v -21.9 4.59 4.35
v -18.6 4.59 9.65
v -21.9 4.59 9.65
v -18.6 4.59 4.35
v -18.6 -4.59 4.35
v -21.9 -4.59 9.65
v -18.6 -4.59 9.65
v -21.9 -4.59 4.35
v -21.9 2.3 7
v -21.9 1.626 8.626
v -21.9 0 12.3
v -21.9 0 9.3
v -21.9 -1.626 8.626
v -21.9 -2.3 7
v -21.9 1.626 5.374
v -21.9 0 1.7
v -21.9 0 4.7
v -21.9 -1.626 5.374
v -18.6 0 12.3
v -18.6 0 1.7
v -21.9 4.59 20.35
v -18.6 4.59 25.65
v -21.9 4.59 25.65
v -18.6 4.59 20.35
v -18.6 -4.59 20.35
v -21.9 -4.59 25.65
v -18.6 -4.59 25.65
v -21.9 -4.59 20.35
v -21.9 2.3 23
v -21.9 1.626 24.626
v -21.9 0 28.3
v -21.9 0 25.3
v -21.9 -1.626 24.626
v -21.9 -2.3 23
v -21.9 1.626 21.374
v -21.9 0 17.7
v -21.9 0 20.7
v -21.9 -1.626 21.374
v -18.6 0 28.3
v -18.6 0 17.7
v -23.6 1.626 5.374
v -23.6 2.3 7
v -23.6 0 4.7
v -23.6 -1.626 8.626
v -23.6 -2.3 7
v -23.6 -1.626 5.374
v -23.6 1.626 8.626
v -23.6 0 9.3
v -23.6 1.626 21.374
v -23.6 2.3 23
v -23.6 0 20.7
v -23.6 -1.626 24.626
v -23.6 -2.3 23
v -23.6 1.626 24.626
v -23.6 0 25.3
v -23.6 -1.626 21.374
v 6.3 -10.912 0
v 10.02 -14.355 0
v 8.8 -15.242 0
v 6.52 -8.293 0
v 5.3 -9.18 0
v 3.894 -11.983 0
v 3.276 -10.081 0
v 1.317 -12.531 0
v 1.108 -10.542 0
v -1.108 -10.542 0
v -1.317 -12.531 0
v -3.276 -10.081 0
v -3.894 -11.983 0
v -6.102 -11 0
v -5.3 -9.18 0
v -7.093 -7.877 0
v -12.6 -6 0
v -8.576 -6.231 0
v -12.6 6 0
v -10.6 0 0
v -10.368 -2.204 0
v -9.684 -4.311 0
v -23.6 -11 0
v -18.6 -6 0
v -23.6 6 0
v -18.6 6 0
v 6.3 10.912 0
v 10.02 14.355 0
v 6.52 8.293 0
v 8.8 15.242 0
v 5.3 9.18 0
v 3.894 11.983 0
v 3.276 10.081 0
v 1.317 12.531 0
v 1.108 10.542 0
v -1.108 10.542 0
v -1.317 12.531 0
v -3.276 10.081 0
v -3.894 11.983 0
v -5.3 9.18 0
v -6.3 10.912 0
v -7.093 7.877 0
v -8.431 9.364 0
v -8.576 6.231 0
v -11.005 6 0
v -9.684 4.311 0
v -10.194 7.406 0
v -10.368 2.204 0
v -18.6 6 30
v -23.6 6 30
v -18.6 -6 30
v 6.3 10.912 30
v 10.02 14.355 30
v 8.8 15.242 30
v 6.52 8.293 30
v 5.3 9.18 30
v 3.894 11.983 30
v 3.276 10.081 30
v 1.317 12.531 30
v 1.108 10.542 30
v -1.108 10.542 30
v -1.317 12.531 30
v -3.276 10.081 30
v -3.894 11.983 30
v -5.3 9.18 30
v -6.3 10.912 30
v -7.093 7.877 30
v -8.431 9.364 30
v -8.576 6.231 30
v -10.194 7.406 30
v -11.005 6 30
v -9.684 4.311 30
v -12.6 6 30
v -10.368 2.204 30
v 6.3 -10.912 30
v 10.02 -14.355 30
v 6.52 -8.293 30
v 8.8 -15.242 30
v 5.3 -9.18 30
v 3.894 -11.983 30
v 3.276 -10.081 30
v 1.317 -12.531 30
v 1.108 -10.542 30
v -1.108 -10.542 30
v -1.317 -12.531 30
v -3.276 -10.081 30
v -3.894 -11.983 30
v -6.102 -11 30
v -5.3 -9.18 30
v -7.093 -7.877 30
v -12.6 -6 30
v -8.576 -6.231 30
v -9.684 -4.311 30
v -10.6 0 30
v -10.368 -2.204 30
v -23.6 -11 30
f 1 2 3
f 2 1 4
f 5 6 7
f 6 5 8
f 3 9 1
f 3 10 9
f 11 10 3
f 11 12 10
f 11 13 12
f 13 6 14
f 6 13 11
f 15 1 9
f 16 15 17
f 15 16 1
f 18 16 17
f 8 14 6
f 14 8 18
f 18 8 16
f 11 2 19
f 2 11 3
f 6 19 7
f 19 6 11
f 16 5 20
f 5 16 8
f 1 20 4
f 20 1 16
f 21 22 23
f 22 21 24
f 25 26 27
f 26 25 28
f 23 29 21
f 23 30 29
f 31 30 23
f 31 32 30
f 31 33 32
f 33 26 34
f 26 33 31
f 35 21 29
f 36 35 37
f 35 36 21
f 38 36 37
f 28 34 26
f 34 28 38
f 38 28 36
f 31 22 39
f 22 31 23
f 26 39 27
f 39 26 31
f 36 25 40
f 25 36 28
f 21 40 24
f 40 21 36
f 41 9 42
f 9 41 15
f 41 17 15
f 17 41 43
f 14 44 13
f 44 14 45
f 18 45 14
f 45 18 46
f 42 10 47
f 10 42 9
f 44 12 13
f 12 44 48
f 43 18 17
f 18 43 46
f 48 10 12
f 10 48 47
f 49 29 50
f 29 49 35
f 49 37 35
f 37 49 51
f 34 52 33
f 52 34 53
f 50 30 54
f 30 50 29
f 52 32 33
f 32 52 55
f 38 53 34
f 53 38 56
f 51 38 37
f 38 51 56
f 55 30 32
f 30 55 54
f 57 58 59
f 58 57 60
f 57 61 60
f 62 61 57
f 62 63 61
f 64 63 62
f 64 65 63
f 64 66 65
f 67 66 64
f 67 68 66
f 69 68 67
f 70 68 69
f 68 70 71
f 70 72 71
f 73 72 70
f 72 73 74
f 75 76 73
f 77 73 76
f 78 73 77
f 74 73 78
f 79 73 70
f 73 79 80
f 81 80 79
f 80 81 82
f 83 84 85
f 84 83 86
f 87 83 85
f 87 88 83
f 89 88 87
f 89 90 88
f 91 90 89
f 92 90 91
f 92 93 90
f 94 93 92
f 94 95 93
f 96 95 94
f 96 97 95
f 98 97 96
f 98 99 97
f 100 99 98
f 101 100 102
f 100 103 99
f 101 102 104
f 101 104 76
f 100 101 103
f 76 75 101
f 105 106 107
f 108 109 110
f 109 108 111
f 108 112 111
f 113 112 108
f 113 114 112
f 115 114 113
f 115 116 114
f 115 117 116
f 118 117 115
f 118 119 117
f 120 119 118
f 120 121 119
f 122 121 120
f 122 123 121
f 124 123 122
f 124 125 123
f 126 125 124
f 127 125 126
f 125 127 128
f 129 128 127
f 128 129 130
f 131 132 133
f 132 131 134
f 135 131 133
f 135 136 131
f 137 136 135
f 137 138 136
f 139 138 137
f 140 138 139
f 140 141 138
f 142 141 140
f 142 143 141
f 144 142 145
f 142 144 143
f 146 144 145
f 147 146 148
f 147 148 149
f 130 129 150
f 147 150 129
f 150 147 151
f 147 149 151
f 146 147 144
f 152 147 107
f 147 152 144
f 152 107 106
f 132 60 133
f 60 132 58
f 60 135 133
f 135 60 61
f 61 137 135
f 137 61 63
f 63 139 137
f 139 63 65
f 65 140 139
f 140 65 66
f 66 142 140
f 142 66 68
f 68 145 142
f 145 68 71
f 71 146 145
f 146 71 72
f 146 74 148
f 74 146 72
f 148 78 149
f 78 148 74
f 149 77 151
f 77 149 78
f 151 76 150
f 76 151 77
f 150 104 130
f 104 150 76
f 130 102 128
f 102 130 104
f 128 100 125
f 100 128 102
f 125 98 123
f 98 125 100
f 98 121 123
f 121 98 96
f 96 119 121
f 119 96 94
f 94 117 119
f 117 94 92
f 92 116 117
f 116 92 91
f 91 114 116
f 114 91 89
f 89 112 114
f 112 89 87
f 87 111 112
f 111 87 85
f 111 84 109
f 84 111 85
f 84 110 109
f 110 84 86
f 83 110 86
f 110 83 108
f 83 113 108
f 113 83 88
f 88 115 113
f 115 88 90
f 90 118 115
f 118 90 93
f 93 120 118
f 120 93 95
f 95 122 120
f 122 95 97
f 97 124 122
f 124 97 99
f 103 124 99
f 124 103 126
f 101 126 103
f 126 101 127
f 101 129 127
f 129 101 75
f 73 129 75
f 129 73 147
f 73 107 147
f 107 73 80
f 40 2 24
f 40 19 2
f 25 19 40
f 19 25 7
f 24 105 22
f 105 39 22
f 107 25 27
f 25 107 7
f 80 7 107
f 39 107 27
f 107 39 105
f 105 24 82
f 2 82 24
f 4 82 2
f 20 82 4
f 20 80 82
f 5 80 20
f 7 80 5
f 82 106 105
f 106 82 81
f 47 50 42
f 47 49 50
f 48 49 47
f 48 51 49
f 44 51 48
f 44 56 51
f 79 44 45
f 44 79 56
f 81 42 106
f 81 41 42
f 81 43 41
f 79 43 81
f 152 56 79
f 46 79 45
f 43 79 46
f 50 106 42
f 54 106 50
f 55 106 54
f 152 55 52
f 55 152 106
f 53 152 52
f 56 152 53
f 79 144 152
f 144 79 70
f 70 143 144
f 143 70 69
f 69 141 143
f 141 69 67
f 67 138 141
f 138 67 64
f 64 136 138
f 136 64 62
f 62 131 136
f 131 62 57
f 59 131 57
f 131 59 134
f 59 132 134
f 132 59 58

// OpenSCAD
//overall width of clip, in mm, measure hardhat slot, 25mm minimum
clip_width=30; 

//Diameter of flashlight, in mm, 21.2 for Sipik SK-68 cloen
diam=21.2;

//Thickness of clip, in mm
thickness=2;

//length of release tab, in mm
release_tab_length=5;

//size of nut trap, 6mm max
nut_trap_size=5.3;

//size of screw holes
screw_hole_size=4.6;

module insertion_tabs() //tabs at mouth of clip (draws a big wide triangle
{
polygon([[0,0],[50,50*sqrt(3)],[50,-50*sqrt(3)]],[[0,1,2]]);
}

module insertion_tabs_trim() //trims off big triangle leaving the two tabs
{
translate([(thickness/2)*sqrt(3),0])
{
polygon([[0,0],[50,50*sqrt(3)],[50,-50*sqrt(3)]],[[0,1,2]]);
}
difference()
{
circle(r=100);
circle(r=(diam/2)+thickness+release_tab_length);
}
}




module clamp() //draws clamp section
translate([-(diam/2)-thickness,-2.5,0])
{
difference()
{
square([22,17],center=true);
translate([-3,2.5,0])
{
square([6,12],center=true);
}
}
}


module nut_trap()
{
union()
{
translate([-(diam/2)-thickness-6-3.3,0,7])
{
rotate(90,[0,1,0])
{
linear_extrude(height=3.4)
{
circle(r=nut_trap_size,$fn=6);
}
}
}

translate([-(diam/2)-thickness-6-3.3,0,clip_width-7])
{
rotate(90,[0,1,0])
{
linear_extrude(height=3.4)
{
circle(r=nut_trap_size,$fn=6);
}
}
}
}
}


module clamp_holes()
{
union()
{
translate([-(diam/2)-thickness-6-6,0,7])
{
rotate(90,[0,1,0])
{
linear_extrude(height=6)
{
#circle(r=screw_hole_size/2);
}
}
}

translate([-(diam/2)-thickness-6-6,0,clip_width-7])
{
rotate(90,[0,1,0])
{
linear_extrude(height=6)
{
#circle(r=screw_hole_size/2);
}
}
}
}
}



//main body
difference()
{
linear_extrude(height=clip_width)
{
union()
{
difference()
	{
		union()
		{
			circle(r=(diam/2)+thickness);
			insertion_tabs();
			
		}	
		insertion_tabs_trim();
		circle(r=(diam/2));
	}
difference()
{
clamp();
circle(r=(diam/2));
}
}
}
nut_trap();
clamp_holes();
}
